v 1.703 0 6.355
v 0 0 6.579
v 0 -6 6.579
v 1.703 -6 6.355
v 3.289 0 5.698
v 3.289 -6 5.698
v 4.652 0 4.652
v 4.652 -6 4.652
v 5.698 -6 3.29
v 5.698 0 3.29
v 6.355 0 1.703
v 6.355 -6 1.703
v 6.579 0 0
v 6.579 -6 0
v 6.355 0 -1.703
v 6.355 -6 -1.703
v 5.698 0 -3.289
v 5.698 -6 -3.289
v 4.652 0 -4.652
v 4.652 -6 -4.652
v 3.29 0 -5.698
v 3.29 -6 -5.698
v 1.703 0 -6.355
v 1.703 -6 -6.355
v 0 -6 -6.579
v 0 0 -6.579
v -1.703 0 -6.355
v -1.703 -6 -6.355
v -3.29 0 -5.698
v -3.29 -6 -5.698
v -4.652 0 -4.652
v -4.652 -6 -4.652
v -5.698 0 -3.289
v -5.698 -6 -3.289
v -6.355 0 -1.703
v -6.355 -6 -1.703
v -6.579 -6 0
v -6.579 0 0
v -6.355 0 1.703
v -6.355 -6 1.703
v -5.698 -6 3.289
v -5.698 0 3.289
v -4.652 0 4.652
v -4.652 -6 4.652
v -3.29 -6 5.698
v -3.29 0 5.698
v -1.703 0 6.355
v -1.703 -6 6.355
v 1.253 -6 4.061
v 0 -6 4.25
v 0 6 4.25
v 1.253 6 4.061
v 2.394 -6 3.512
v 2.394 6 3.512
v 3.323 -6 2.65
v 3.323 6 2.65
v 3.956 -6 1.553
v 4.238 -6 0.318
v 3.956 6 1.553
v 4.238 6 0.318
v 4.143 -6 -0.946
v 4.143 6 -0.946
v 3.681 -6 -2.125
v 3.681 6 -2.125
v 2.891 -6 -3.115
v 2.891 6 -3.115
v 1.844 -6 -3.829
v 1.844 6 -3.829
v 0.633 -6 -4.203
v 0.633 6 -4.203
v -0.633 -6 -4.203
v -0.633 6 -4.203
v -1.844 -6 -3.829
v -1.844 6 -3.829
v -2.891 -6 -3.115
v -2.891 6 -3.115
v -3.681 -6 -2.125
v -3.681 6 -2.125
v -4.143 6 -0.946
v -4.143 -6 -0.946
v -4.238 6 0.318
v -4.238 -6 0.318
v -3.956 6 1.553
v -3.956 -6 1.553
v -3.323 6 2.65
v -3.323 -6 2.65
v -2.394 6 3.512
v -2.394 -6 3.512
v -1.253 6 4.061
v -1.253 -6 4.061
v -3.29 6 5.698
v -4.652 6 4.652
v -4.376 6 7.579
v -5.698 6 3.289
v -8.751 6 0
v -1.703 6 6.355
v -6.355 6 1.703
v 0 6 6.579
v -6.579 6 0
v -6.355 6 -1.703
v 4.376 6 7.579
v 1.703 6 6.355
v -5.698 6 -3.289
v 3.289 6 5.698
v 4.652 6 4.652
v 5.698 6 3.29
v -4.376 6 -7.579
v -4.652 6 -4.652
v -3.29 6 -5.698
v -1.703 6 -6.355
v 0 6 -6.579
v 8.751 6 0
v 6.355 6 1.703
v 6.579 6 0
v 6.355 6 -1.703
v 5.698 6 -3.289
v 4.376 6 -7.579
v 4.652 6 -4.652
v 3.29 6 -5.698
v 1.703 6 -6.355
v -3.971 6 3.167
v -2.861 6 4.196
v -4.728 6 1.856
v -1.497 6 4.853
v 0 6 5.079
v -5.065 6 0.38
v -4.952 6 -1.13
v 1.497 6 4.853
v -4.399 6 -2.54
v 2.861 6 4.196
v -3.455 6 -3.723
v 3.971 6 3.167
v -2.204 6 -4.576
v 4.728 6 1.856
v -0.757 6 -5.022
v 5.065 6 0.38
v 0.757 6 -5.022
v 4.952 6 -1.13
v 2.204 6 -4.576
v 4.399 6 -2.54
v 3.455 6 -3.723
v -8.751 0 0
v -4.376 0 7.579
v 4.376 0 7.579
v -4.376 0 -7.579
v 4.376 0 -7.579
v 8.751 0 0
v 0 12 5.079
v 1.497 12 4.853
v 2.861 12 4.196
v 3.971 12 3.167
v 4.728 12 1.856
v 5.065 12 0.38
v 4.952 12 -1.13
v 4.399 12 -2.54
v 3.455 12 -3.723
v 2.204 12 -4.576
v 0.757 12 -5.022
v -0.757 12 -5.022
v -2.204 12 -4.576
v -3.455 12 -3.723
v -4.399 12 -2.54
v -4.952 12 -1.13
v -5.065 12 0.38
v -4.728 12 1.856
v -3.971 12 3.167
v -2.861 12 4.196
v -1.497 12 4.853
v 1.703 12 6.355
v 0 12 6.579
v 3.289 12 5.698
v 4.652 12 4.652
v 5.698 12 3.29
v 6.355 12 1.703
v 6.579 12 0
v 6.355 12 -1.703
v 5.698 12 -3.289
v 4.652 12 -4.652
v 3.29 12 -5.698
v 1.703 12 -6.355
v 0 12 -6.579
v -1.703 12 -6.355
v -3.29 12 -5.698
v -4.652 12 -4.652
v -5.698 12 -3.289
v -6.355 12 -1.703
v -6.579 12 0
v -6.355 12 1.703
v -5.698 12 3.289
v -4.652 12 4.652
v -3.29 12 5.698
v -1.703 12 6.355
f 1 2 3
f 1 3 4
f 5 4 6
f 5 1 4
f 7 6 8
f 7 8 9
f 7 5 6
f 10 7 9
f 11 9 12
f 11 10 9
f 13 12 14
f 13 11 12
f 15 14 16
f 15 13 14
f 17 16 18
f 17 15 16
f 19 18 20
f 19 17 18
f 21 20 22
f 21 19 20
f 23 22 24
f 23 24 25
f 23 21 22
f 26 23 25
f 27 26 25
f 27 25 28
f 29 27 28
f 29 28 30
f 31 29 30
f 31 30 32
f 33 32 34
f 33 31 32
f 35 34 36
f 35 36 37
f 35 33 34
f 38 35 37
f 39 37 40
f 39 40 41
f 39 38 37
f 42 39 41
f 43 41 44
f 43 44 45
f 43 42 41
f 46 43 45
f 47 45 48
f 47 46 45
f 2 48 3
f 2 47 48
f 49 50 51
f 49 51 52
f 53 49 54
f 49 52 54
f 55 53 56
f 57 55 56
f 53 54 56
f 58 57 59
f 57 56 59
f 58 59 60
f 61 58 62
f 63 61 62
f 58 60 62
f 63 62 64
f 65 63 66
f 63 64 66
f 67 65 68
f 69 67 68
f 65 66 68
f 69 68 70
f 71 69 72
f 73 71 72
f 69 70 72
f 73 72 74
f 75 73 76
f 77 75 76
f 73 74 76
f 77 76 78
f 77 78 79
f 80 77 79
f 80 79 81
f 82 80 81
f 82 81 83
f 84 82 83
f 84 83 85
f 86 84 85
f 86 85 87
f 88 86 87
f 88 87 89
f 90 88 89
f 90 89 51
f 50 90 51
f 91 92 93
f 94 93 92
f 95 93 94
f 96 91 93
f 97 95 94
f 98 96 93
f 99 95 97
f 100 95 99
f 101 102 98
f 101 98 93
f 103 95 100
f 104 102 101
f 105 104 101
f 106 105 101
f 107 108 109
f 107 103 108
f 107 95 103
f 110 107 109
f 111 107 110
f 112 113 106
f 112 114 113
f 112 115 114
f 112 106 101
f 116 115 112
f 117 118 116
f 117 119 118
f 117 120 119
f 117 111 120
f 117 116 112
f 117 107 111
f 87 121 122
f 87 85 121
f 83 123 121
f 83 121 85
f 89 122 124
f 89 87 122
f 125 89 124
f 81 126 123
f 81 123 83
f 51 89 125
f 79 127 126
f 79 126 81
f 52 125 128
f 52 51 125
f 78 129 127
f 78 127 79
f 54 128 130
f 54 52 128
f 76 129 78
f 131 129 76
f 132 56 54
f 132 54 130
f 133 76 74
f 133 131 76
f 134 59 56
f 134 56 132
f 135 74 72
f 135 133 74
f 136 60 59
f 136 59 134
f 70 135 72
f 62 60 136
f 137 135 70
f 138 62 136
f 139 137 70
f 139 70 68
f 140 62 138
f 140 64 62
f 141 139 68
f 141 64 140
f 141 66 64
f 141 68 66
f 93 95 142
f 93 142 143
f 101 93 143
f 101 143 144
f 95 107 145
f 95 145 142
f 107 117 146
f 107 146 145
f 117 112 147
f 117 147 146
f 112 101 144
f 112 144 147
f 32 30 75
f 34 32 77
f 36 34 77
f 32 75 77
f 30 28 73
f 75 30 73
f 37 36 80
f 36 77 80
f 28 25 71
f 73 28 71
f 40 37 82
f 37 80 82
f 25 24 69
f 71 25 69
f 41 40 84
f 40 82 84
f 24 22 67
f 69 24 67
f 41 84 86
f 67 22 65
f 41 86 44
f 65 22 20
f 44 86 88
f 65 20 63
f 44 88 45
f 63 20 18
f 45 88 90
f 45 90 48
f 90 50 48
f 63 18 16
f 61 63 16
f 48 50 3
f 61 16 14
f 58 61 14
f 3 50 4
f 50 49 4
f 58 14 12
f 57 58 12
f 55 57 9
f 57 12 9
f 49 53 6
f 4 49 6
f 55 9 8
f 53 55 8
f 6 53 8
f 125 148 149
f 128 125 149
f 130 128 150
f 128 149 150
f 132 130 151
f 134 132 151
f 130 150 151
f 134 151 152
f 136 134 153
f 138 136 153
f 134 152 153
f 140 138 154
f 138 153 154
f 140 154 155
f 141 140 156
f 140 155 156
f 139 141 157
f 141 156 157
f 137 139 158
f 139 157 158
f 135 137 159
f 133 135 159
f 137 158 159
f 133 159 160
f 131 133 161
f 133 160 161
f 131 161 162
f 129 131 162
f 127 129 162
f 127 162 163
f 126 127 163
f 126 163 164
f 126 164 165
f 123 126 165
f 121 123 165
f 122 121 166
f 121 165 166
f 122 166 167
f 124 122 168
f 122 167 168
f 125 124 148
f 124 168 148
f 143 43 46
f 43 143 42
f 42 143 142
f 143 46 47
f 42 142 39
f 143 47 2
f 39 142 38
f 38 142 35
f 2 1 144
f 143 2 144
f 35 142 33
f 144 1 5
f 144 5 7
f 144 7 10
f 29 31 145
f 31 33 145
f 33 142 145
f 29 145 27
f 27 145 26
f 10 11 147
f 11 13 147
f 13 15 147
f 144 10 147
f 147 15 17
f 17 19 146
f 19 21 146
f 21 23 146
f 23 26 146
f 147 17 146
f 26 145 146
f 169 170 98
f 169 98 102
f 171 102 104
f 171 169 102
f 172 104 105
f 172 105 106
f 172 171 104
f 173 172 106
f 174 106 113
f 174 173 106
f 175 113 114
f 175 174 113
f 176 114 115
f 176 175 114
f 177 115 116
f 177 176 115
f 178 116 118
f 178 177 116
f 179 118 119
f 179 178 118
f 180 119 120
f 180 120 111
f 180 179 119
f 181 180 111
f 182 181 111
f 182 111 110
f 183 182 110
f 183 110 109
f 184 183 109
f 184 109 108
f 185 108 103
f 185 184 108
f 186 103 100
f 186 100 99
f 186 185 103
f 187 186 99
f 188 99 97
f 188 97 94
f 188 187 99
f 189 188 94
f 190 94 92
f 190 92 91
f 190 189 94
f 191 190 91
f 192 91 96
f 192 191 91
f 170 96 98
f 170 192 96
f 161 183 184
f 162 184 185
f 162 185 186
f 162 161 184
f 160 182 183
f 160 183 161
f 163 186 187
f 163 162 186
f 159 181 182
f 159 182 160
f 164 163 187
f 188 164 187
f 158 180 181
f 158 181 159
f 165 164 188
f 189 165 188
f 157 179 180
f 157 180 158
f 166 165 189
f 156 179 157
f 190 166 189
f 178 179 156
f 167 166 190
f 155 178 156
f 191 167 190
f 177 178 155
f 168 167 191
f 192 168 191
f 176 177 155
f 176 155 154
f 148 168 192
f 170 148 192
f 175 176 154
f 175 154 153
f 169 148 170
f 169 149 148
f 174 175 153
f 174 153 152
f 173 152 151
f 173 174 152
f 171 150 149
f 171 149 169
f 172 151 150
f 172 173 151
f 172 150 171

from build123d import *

# Parameters (mm, degrees)
SKETCH_1_R      = 6.579
SKETCH_1_R_2    = 4.25
EXTRUDE_1_DEPTH = 6
EXTRUDE_START   = 6
SKETCH_1_3_R    = 4.25
EXTRUDE_2_DEPTH = 6
SKETCH_2_R      = 6.579
SKETCH_2_R_2    = 5.079
EXTRUDE_3_DEPTH = 6


with BuildPart() as part:
    # 草图1 → 凸台-拉伸1 (new body)
    with BuildSketch(Plane(origin=(0, 0, 0), x_dir=(1, 0, 0), z_dir=(0, 1, 0))):
        Circle(SKETCH_1_R)
        Circle(SKETCH_1_R_2, mode=Mode.SUBTRACT)
    extrude(amount=-EXTRUDE_1_DEPTH)

    # 草图1<3> → 凸台-拉伸2 (add)
    with BuildSketch(Plane(origin=(0, 0, 0), x_dir=(1, 0, 0), z_dir=(0, 1, 0)).offset(EXTRUDE_START)):
        Polygon((-4.37573769, -7.579), (4.37573769, -7.579), (8.75147538, 0), (4.37573769, 7.579), (-4.37573769, 7.579), (-8.75147538, 0), align=None)
        Circle(SKETCH_1_3_R, mode=Mode.SUBTRACT)
    extrude(amount=-EXTRUDE_2_DEPTH)

    # 草图2 → 凸台-拉伸3 (add)
    with BuildSketch(Plane(origin=(0, 6, 0), x_dir=(1, 0, 0), z_dir=(0, 1, 0)).offset(EXTRUDE_START)):
        Circle(SKETCH_2_R)
        Circle(SKETCH_2_R_2, mode=Mode.SUBTRACT)
    extrude(amount=-EXTRUDE_3_DEPTH)


solid = part.part
